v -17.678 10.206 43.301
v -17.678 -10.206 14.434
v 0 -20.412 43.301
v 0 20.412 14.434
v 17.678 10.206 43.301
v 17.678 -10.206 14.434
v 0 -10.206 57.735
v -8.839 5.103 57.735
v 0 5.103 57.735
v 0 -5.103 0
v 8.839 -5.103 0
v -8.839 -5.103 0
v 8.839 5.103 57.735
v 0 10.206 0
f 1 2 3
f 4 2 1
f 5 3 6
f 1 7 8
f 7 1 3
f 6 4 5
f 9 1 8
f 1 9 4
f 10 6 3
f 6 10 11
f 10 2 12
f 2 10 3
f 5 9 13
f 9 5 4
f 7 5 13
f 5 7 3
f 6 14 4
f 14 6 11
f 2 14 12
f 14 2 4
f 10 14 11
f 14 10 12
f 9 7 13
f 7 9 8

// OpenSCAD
//////////////////////////////////////////////////////////////////////////////////////////
//  
//  'Dürer's Solid (60°)' by Chris Molloy (http://chrismolloy.com/durer)
//  
//  Released under Creative Commons - Attribution - Share Alike licence
//  
//  For more information see:
//  https://en.wikipedia.org/wiki/Melencolia_I
//  https://en.wikipedia.org/wiki/Truncated_triangular_trapezohedron#D.C3.BCrer.27s_solid
//  http://mathworld.wolfram.com/DuerersSolid.html
//  
//////////////////////////////////////////////////////////////////////////////////////////

// Length of edge of cube base (resulting polyhedron will be ≈2.3 times this high)
scale_base = 25; // mm

/* Hidden */
zz = 1 / sqrt(3); // ≈ 0.57735
theta = acos(zz); // ≈ 54.73561°

stretch_60 = 2;
unit_height_60 = (sqrt(3) - zz) * stretch_60; // ≈ 2.30940
drop_60 = ((sqrt(3) * stretch_60) - unit_height_60) / 2; // = zz

module unit_cube() {
  rotate([0, 0, -15]) {
    rotate(a = theta, v = [1, -1, 0]) {
      cube([scale_base, scale_base, scale_base]);
    }
  }
}

module durers_solid(drop, stretch, unit_height) {
  difference() {
    translate([0, 0, -drop * scale_base]) {
      scale([1, 1, stretch]) {
        unit_cube();
      }
    }
    translate([0, 0, -scale_base / 2]) {
      cube([scale_base, scale_base, scale_base], center = true);
    }
    translate([0, 0, (unit_height * scale_base) + (scale_base / 2)]) {
      cube([scale_base, scale_base, scale_base], center = true);
    }
  }
}

durers_solid(drop_60, stretch_60, unit_height_60);
